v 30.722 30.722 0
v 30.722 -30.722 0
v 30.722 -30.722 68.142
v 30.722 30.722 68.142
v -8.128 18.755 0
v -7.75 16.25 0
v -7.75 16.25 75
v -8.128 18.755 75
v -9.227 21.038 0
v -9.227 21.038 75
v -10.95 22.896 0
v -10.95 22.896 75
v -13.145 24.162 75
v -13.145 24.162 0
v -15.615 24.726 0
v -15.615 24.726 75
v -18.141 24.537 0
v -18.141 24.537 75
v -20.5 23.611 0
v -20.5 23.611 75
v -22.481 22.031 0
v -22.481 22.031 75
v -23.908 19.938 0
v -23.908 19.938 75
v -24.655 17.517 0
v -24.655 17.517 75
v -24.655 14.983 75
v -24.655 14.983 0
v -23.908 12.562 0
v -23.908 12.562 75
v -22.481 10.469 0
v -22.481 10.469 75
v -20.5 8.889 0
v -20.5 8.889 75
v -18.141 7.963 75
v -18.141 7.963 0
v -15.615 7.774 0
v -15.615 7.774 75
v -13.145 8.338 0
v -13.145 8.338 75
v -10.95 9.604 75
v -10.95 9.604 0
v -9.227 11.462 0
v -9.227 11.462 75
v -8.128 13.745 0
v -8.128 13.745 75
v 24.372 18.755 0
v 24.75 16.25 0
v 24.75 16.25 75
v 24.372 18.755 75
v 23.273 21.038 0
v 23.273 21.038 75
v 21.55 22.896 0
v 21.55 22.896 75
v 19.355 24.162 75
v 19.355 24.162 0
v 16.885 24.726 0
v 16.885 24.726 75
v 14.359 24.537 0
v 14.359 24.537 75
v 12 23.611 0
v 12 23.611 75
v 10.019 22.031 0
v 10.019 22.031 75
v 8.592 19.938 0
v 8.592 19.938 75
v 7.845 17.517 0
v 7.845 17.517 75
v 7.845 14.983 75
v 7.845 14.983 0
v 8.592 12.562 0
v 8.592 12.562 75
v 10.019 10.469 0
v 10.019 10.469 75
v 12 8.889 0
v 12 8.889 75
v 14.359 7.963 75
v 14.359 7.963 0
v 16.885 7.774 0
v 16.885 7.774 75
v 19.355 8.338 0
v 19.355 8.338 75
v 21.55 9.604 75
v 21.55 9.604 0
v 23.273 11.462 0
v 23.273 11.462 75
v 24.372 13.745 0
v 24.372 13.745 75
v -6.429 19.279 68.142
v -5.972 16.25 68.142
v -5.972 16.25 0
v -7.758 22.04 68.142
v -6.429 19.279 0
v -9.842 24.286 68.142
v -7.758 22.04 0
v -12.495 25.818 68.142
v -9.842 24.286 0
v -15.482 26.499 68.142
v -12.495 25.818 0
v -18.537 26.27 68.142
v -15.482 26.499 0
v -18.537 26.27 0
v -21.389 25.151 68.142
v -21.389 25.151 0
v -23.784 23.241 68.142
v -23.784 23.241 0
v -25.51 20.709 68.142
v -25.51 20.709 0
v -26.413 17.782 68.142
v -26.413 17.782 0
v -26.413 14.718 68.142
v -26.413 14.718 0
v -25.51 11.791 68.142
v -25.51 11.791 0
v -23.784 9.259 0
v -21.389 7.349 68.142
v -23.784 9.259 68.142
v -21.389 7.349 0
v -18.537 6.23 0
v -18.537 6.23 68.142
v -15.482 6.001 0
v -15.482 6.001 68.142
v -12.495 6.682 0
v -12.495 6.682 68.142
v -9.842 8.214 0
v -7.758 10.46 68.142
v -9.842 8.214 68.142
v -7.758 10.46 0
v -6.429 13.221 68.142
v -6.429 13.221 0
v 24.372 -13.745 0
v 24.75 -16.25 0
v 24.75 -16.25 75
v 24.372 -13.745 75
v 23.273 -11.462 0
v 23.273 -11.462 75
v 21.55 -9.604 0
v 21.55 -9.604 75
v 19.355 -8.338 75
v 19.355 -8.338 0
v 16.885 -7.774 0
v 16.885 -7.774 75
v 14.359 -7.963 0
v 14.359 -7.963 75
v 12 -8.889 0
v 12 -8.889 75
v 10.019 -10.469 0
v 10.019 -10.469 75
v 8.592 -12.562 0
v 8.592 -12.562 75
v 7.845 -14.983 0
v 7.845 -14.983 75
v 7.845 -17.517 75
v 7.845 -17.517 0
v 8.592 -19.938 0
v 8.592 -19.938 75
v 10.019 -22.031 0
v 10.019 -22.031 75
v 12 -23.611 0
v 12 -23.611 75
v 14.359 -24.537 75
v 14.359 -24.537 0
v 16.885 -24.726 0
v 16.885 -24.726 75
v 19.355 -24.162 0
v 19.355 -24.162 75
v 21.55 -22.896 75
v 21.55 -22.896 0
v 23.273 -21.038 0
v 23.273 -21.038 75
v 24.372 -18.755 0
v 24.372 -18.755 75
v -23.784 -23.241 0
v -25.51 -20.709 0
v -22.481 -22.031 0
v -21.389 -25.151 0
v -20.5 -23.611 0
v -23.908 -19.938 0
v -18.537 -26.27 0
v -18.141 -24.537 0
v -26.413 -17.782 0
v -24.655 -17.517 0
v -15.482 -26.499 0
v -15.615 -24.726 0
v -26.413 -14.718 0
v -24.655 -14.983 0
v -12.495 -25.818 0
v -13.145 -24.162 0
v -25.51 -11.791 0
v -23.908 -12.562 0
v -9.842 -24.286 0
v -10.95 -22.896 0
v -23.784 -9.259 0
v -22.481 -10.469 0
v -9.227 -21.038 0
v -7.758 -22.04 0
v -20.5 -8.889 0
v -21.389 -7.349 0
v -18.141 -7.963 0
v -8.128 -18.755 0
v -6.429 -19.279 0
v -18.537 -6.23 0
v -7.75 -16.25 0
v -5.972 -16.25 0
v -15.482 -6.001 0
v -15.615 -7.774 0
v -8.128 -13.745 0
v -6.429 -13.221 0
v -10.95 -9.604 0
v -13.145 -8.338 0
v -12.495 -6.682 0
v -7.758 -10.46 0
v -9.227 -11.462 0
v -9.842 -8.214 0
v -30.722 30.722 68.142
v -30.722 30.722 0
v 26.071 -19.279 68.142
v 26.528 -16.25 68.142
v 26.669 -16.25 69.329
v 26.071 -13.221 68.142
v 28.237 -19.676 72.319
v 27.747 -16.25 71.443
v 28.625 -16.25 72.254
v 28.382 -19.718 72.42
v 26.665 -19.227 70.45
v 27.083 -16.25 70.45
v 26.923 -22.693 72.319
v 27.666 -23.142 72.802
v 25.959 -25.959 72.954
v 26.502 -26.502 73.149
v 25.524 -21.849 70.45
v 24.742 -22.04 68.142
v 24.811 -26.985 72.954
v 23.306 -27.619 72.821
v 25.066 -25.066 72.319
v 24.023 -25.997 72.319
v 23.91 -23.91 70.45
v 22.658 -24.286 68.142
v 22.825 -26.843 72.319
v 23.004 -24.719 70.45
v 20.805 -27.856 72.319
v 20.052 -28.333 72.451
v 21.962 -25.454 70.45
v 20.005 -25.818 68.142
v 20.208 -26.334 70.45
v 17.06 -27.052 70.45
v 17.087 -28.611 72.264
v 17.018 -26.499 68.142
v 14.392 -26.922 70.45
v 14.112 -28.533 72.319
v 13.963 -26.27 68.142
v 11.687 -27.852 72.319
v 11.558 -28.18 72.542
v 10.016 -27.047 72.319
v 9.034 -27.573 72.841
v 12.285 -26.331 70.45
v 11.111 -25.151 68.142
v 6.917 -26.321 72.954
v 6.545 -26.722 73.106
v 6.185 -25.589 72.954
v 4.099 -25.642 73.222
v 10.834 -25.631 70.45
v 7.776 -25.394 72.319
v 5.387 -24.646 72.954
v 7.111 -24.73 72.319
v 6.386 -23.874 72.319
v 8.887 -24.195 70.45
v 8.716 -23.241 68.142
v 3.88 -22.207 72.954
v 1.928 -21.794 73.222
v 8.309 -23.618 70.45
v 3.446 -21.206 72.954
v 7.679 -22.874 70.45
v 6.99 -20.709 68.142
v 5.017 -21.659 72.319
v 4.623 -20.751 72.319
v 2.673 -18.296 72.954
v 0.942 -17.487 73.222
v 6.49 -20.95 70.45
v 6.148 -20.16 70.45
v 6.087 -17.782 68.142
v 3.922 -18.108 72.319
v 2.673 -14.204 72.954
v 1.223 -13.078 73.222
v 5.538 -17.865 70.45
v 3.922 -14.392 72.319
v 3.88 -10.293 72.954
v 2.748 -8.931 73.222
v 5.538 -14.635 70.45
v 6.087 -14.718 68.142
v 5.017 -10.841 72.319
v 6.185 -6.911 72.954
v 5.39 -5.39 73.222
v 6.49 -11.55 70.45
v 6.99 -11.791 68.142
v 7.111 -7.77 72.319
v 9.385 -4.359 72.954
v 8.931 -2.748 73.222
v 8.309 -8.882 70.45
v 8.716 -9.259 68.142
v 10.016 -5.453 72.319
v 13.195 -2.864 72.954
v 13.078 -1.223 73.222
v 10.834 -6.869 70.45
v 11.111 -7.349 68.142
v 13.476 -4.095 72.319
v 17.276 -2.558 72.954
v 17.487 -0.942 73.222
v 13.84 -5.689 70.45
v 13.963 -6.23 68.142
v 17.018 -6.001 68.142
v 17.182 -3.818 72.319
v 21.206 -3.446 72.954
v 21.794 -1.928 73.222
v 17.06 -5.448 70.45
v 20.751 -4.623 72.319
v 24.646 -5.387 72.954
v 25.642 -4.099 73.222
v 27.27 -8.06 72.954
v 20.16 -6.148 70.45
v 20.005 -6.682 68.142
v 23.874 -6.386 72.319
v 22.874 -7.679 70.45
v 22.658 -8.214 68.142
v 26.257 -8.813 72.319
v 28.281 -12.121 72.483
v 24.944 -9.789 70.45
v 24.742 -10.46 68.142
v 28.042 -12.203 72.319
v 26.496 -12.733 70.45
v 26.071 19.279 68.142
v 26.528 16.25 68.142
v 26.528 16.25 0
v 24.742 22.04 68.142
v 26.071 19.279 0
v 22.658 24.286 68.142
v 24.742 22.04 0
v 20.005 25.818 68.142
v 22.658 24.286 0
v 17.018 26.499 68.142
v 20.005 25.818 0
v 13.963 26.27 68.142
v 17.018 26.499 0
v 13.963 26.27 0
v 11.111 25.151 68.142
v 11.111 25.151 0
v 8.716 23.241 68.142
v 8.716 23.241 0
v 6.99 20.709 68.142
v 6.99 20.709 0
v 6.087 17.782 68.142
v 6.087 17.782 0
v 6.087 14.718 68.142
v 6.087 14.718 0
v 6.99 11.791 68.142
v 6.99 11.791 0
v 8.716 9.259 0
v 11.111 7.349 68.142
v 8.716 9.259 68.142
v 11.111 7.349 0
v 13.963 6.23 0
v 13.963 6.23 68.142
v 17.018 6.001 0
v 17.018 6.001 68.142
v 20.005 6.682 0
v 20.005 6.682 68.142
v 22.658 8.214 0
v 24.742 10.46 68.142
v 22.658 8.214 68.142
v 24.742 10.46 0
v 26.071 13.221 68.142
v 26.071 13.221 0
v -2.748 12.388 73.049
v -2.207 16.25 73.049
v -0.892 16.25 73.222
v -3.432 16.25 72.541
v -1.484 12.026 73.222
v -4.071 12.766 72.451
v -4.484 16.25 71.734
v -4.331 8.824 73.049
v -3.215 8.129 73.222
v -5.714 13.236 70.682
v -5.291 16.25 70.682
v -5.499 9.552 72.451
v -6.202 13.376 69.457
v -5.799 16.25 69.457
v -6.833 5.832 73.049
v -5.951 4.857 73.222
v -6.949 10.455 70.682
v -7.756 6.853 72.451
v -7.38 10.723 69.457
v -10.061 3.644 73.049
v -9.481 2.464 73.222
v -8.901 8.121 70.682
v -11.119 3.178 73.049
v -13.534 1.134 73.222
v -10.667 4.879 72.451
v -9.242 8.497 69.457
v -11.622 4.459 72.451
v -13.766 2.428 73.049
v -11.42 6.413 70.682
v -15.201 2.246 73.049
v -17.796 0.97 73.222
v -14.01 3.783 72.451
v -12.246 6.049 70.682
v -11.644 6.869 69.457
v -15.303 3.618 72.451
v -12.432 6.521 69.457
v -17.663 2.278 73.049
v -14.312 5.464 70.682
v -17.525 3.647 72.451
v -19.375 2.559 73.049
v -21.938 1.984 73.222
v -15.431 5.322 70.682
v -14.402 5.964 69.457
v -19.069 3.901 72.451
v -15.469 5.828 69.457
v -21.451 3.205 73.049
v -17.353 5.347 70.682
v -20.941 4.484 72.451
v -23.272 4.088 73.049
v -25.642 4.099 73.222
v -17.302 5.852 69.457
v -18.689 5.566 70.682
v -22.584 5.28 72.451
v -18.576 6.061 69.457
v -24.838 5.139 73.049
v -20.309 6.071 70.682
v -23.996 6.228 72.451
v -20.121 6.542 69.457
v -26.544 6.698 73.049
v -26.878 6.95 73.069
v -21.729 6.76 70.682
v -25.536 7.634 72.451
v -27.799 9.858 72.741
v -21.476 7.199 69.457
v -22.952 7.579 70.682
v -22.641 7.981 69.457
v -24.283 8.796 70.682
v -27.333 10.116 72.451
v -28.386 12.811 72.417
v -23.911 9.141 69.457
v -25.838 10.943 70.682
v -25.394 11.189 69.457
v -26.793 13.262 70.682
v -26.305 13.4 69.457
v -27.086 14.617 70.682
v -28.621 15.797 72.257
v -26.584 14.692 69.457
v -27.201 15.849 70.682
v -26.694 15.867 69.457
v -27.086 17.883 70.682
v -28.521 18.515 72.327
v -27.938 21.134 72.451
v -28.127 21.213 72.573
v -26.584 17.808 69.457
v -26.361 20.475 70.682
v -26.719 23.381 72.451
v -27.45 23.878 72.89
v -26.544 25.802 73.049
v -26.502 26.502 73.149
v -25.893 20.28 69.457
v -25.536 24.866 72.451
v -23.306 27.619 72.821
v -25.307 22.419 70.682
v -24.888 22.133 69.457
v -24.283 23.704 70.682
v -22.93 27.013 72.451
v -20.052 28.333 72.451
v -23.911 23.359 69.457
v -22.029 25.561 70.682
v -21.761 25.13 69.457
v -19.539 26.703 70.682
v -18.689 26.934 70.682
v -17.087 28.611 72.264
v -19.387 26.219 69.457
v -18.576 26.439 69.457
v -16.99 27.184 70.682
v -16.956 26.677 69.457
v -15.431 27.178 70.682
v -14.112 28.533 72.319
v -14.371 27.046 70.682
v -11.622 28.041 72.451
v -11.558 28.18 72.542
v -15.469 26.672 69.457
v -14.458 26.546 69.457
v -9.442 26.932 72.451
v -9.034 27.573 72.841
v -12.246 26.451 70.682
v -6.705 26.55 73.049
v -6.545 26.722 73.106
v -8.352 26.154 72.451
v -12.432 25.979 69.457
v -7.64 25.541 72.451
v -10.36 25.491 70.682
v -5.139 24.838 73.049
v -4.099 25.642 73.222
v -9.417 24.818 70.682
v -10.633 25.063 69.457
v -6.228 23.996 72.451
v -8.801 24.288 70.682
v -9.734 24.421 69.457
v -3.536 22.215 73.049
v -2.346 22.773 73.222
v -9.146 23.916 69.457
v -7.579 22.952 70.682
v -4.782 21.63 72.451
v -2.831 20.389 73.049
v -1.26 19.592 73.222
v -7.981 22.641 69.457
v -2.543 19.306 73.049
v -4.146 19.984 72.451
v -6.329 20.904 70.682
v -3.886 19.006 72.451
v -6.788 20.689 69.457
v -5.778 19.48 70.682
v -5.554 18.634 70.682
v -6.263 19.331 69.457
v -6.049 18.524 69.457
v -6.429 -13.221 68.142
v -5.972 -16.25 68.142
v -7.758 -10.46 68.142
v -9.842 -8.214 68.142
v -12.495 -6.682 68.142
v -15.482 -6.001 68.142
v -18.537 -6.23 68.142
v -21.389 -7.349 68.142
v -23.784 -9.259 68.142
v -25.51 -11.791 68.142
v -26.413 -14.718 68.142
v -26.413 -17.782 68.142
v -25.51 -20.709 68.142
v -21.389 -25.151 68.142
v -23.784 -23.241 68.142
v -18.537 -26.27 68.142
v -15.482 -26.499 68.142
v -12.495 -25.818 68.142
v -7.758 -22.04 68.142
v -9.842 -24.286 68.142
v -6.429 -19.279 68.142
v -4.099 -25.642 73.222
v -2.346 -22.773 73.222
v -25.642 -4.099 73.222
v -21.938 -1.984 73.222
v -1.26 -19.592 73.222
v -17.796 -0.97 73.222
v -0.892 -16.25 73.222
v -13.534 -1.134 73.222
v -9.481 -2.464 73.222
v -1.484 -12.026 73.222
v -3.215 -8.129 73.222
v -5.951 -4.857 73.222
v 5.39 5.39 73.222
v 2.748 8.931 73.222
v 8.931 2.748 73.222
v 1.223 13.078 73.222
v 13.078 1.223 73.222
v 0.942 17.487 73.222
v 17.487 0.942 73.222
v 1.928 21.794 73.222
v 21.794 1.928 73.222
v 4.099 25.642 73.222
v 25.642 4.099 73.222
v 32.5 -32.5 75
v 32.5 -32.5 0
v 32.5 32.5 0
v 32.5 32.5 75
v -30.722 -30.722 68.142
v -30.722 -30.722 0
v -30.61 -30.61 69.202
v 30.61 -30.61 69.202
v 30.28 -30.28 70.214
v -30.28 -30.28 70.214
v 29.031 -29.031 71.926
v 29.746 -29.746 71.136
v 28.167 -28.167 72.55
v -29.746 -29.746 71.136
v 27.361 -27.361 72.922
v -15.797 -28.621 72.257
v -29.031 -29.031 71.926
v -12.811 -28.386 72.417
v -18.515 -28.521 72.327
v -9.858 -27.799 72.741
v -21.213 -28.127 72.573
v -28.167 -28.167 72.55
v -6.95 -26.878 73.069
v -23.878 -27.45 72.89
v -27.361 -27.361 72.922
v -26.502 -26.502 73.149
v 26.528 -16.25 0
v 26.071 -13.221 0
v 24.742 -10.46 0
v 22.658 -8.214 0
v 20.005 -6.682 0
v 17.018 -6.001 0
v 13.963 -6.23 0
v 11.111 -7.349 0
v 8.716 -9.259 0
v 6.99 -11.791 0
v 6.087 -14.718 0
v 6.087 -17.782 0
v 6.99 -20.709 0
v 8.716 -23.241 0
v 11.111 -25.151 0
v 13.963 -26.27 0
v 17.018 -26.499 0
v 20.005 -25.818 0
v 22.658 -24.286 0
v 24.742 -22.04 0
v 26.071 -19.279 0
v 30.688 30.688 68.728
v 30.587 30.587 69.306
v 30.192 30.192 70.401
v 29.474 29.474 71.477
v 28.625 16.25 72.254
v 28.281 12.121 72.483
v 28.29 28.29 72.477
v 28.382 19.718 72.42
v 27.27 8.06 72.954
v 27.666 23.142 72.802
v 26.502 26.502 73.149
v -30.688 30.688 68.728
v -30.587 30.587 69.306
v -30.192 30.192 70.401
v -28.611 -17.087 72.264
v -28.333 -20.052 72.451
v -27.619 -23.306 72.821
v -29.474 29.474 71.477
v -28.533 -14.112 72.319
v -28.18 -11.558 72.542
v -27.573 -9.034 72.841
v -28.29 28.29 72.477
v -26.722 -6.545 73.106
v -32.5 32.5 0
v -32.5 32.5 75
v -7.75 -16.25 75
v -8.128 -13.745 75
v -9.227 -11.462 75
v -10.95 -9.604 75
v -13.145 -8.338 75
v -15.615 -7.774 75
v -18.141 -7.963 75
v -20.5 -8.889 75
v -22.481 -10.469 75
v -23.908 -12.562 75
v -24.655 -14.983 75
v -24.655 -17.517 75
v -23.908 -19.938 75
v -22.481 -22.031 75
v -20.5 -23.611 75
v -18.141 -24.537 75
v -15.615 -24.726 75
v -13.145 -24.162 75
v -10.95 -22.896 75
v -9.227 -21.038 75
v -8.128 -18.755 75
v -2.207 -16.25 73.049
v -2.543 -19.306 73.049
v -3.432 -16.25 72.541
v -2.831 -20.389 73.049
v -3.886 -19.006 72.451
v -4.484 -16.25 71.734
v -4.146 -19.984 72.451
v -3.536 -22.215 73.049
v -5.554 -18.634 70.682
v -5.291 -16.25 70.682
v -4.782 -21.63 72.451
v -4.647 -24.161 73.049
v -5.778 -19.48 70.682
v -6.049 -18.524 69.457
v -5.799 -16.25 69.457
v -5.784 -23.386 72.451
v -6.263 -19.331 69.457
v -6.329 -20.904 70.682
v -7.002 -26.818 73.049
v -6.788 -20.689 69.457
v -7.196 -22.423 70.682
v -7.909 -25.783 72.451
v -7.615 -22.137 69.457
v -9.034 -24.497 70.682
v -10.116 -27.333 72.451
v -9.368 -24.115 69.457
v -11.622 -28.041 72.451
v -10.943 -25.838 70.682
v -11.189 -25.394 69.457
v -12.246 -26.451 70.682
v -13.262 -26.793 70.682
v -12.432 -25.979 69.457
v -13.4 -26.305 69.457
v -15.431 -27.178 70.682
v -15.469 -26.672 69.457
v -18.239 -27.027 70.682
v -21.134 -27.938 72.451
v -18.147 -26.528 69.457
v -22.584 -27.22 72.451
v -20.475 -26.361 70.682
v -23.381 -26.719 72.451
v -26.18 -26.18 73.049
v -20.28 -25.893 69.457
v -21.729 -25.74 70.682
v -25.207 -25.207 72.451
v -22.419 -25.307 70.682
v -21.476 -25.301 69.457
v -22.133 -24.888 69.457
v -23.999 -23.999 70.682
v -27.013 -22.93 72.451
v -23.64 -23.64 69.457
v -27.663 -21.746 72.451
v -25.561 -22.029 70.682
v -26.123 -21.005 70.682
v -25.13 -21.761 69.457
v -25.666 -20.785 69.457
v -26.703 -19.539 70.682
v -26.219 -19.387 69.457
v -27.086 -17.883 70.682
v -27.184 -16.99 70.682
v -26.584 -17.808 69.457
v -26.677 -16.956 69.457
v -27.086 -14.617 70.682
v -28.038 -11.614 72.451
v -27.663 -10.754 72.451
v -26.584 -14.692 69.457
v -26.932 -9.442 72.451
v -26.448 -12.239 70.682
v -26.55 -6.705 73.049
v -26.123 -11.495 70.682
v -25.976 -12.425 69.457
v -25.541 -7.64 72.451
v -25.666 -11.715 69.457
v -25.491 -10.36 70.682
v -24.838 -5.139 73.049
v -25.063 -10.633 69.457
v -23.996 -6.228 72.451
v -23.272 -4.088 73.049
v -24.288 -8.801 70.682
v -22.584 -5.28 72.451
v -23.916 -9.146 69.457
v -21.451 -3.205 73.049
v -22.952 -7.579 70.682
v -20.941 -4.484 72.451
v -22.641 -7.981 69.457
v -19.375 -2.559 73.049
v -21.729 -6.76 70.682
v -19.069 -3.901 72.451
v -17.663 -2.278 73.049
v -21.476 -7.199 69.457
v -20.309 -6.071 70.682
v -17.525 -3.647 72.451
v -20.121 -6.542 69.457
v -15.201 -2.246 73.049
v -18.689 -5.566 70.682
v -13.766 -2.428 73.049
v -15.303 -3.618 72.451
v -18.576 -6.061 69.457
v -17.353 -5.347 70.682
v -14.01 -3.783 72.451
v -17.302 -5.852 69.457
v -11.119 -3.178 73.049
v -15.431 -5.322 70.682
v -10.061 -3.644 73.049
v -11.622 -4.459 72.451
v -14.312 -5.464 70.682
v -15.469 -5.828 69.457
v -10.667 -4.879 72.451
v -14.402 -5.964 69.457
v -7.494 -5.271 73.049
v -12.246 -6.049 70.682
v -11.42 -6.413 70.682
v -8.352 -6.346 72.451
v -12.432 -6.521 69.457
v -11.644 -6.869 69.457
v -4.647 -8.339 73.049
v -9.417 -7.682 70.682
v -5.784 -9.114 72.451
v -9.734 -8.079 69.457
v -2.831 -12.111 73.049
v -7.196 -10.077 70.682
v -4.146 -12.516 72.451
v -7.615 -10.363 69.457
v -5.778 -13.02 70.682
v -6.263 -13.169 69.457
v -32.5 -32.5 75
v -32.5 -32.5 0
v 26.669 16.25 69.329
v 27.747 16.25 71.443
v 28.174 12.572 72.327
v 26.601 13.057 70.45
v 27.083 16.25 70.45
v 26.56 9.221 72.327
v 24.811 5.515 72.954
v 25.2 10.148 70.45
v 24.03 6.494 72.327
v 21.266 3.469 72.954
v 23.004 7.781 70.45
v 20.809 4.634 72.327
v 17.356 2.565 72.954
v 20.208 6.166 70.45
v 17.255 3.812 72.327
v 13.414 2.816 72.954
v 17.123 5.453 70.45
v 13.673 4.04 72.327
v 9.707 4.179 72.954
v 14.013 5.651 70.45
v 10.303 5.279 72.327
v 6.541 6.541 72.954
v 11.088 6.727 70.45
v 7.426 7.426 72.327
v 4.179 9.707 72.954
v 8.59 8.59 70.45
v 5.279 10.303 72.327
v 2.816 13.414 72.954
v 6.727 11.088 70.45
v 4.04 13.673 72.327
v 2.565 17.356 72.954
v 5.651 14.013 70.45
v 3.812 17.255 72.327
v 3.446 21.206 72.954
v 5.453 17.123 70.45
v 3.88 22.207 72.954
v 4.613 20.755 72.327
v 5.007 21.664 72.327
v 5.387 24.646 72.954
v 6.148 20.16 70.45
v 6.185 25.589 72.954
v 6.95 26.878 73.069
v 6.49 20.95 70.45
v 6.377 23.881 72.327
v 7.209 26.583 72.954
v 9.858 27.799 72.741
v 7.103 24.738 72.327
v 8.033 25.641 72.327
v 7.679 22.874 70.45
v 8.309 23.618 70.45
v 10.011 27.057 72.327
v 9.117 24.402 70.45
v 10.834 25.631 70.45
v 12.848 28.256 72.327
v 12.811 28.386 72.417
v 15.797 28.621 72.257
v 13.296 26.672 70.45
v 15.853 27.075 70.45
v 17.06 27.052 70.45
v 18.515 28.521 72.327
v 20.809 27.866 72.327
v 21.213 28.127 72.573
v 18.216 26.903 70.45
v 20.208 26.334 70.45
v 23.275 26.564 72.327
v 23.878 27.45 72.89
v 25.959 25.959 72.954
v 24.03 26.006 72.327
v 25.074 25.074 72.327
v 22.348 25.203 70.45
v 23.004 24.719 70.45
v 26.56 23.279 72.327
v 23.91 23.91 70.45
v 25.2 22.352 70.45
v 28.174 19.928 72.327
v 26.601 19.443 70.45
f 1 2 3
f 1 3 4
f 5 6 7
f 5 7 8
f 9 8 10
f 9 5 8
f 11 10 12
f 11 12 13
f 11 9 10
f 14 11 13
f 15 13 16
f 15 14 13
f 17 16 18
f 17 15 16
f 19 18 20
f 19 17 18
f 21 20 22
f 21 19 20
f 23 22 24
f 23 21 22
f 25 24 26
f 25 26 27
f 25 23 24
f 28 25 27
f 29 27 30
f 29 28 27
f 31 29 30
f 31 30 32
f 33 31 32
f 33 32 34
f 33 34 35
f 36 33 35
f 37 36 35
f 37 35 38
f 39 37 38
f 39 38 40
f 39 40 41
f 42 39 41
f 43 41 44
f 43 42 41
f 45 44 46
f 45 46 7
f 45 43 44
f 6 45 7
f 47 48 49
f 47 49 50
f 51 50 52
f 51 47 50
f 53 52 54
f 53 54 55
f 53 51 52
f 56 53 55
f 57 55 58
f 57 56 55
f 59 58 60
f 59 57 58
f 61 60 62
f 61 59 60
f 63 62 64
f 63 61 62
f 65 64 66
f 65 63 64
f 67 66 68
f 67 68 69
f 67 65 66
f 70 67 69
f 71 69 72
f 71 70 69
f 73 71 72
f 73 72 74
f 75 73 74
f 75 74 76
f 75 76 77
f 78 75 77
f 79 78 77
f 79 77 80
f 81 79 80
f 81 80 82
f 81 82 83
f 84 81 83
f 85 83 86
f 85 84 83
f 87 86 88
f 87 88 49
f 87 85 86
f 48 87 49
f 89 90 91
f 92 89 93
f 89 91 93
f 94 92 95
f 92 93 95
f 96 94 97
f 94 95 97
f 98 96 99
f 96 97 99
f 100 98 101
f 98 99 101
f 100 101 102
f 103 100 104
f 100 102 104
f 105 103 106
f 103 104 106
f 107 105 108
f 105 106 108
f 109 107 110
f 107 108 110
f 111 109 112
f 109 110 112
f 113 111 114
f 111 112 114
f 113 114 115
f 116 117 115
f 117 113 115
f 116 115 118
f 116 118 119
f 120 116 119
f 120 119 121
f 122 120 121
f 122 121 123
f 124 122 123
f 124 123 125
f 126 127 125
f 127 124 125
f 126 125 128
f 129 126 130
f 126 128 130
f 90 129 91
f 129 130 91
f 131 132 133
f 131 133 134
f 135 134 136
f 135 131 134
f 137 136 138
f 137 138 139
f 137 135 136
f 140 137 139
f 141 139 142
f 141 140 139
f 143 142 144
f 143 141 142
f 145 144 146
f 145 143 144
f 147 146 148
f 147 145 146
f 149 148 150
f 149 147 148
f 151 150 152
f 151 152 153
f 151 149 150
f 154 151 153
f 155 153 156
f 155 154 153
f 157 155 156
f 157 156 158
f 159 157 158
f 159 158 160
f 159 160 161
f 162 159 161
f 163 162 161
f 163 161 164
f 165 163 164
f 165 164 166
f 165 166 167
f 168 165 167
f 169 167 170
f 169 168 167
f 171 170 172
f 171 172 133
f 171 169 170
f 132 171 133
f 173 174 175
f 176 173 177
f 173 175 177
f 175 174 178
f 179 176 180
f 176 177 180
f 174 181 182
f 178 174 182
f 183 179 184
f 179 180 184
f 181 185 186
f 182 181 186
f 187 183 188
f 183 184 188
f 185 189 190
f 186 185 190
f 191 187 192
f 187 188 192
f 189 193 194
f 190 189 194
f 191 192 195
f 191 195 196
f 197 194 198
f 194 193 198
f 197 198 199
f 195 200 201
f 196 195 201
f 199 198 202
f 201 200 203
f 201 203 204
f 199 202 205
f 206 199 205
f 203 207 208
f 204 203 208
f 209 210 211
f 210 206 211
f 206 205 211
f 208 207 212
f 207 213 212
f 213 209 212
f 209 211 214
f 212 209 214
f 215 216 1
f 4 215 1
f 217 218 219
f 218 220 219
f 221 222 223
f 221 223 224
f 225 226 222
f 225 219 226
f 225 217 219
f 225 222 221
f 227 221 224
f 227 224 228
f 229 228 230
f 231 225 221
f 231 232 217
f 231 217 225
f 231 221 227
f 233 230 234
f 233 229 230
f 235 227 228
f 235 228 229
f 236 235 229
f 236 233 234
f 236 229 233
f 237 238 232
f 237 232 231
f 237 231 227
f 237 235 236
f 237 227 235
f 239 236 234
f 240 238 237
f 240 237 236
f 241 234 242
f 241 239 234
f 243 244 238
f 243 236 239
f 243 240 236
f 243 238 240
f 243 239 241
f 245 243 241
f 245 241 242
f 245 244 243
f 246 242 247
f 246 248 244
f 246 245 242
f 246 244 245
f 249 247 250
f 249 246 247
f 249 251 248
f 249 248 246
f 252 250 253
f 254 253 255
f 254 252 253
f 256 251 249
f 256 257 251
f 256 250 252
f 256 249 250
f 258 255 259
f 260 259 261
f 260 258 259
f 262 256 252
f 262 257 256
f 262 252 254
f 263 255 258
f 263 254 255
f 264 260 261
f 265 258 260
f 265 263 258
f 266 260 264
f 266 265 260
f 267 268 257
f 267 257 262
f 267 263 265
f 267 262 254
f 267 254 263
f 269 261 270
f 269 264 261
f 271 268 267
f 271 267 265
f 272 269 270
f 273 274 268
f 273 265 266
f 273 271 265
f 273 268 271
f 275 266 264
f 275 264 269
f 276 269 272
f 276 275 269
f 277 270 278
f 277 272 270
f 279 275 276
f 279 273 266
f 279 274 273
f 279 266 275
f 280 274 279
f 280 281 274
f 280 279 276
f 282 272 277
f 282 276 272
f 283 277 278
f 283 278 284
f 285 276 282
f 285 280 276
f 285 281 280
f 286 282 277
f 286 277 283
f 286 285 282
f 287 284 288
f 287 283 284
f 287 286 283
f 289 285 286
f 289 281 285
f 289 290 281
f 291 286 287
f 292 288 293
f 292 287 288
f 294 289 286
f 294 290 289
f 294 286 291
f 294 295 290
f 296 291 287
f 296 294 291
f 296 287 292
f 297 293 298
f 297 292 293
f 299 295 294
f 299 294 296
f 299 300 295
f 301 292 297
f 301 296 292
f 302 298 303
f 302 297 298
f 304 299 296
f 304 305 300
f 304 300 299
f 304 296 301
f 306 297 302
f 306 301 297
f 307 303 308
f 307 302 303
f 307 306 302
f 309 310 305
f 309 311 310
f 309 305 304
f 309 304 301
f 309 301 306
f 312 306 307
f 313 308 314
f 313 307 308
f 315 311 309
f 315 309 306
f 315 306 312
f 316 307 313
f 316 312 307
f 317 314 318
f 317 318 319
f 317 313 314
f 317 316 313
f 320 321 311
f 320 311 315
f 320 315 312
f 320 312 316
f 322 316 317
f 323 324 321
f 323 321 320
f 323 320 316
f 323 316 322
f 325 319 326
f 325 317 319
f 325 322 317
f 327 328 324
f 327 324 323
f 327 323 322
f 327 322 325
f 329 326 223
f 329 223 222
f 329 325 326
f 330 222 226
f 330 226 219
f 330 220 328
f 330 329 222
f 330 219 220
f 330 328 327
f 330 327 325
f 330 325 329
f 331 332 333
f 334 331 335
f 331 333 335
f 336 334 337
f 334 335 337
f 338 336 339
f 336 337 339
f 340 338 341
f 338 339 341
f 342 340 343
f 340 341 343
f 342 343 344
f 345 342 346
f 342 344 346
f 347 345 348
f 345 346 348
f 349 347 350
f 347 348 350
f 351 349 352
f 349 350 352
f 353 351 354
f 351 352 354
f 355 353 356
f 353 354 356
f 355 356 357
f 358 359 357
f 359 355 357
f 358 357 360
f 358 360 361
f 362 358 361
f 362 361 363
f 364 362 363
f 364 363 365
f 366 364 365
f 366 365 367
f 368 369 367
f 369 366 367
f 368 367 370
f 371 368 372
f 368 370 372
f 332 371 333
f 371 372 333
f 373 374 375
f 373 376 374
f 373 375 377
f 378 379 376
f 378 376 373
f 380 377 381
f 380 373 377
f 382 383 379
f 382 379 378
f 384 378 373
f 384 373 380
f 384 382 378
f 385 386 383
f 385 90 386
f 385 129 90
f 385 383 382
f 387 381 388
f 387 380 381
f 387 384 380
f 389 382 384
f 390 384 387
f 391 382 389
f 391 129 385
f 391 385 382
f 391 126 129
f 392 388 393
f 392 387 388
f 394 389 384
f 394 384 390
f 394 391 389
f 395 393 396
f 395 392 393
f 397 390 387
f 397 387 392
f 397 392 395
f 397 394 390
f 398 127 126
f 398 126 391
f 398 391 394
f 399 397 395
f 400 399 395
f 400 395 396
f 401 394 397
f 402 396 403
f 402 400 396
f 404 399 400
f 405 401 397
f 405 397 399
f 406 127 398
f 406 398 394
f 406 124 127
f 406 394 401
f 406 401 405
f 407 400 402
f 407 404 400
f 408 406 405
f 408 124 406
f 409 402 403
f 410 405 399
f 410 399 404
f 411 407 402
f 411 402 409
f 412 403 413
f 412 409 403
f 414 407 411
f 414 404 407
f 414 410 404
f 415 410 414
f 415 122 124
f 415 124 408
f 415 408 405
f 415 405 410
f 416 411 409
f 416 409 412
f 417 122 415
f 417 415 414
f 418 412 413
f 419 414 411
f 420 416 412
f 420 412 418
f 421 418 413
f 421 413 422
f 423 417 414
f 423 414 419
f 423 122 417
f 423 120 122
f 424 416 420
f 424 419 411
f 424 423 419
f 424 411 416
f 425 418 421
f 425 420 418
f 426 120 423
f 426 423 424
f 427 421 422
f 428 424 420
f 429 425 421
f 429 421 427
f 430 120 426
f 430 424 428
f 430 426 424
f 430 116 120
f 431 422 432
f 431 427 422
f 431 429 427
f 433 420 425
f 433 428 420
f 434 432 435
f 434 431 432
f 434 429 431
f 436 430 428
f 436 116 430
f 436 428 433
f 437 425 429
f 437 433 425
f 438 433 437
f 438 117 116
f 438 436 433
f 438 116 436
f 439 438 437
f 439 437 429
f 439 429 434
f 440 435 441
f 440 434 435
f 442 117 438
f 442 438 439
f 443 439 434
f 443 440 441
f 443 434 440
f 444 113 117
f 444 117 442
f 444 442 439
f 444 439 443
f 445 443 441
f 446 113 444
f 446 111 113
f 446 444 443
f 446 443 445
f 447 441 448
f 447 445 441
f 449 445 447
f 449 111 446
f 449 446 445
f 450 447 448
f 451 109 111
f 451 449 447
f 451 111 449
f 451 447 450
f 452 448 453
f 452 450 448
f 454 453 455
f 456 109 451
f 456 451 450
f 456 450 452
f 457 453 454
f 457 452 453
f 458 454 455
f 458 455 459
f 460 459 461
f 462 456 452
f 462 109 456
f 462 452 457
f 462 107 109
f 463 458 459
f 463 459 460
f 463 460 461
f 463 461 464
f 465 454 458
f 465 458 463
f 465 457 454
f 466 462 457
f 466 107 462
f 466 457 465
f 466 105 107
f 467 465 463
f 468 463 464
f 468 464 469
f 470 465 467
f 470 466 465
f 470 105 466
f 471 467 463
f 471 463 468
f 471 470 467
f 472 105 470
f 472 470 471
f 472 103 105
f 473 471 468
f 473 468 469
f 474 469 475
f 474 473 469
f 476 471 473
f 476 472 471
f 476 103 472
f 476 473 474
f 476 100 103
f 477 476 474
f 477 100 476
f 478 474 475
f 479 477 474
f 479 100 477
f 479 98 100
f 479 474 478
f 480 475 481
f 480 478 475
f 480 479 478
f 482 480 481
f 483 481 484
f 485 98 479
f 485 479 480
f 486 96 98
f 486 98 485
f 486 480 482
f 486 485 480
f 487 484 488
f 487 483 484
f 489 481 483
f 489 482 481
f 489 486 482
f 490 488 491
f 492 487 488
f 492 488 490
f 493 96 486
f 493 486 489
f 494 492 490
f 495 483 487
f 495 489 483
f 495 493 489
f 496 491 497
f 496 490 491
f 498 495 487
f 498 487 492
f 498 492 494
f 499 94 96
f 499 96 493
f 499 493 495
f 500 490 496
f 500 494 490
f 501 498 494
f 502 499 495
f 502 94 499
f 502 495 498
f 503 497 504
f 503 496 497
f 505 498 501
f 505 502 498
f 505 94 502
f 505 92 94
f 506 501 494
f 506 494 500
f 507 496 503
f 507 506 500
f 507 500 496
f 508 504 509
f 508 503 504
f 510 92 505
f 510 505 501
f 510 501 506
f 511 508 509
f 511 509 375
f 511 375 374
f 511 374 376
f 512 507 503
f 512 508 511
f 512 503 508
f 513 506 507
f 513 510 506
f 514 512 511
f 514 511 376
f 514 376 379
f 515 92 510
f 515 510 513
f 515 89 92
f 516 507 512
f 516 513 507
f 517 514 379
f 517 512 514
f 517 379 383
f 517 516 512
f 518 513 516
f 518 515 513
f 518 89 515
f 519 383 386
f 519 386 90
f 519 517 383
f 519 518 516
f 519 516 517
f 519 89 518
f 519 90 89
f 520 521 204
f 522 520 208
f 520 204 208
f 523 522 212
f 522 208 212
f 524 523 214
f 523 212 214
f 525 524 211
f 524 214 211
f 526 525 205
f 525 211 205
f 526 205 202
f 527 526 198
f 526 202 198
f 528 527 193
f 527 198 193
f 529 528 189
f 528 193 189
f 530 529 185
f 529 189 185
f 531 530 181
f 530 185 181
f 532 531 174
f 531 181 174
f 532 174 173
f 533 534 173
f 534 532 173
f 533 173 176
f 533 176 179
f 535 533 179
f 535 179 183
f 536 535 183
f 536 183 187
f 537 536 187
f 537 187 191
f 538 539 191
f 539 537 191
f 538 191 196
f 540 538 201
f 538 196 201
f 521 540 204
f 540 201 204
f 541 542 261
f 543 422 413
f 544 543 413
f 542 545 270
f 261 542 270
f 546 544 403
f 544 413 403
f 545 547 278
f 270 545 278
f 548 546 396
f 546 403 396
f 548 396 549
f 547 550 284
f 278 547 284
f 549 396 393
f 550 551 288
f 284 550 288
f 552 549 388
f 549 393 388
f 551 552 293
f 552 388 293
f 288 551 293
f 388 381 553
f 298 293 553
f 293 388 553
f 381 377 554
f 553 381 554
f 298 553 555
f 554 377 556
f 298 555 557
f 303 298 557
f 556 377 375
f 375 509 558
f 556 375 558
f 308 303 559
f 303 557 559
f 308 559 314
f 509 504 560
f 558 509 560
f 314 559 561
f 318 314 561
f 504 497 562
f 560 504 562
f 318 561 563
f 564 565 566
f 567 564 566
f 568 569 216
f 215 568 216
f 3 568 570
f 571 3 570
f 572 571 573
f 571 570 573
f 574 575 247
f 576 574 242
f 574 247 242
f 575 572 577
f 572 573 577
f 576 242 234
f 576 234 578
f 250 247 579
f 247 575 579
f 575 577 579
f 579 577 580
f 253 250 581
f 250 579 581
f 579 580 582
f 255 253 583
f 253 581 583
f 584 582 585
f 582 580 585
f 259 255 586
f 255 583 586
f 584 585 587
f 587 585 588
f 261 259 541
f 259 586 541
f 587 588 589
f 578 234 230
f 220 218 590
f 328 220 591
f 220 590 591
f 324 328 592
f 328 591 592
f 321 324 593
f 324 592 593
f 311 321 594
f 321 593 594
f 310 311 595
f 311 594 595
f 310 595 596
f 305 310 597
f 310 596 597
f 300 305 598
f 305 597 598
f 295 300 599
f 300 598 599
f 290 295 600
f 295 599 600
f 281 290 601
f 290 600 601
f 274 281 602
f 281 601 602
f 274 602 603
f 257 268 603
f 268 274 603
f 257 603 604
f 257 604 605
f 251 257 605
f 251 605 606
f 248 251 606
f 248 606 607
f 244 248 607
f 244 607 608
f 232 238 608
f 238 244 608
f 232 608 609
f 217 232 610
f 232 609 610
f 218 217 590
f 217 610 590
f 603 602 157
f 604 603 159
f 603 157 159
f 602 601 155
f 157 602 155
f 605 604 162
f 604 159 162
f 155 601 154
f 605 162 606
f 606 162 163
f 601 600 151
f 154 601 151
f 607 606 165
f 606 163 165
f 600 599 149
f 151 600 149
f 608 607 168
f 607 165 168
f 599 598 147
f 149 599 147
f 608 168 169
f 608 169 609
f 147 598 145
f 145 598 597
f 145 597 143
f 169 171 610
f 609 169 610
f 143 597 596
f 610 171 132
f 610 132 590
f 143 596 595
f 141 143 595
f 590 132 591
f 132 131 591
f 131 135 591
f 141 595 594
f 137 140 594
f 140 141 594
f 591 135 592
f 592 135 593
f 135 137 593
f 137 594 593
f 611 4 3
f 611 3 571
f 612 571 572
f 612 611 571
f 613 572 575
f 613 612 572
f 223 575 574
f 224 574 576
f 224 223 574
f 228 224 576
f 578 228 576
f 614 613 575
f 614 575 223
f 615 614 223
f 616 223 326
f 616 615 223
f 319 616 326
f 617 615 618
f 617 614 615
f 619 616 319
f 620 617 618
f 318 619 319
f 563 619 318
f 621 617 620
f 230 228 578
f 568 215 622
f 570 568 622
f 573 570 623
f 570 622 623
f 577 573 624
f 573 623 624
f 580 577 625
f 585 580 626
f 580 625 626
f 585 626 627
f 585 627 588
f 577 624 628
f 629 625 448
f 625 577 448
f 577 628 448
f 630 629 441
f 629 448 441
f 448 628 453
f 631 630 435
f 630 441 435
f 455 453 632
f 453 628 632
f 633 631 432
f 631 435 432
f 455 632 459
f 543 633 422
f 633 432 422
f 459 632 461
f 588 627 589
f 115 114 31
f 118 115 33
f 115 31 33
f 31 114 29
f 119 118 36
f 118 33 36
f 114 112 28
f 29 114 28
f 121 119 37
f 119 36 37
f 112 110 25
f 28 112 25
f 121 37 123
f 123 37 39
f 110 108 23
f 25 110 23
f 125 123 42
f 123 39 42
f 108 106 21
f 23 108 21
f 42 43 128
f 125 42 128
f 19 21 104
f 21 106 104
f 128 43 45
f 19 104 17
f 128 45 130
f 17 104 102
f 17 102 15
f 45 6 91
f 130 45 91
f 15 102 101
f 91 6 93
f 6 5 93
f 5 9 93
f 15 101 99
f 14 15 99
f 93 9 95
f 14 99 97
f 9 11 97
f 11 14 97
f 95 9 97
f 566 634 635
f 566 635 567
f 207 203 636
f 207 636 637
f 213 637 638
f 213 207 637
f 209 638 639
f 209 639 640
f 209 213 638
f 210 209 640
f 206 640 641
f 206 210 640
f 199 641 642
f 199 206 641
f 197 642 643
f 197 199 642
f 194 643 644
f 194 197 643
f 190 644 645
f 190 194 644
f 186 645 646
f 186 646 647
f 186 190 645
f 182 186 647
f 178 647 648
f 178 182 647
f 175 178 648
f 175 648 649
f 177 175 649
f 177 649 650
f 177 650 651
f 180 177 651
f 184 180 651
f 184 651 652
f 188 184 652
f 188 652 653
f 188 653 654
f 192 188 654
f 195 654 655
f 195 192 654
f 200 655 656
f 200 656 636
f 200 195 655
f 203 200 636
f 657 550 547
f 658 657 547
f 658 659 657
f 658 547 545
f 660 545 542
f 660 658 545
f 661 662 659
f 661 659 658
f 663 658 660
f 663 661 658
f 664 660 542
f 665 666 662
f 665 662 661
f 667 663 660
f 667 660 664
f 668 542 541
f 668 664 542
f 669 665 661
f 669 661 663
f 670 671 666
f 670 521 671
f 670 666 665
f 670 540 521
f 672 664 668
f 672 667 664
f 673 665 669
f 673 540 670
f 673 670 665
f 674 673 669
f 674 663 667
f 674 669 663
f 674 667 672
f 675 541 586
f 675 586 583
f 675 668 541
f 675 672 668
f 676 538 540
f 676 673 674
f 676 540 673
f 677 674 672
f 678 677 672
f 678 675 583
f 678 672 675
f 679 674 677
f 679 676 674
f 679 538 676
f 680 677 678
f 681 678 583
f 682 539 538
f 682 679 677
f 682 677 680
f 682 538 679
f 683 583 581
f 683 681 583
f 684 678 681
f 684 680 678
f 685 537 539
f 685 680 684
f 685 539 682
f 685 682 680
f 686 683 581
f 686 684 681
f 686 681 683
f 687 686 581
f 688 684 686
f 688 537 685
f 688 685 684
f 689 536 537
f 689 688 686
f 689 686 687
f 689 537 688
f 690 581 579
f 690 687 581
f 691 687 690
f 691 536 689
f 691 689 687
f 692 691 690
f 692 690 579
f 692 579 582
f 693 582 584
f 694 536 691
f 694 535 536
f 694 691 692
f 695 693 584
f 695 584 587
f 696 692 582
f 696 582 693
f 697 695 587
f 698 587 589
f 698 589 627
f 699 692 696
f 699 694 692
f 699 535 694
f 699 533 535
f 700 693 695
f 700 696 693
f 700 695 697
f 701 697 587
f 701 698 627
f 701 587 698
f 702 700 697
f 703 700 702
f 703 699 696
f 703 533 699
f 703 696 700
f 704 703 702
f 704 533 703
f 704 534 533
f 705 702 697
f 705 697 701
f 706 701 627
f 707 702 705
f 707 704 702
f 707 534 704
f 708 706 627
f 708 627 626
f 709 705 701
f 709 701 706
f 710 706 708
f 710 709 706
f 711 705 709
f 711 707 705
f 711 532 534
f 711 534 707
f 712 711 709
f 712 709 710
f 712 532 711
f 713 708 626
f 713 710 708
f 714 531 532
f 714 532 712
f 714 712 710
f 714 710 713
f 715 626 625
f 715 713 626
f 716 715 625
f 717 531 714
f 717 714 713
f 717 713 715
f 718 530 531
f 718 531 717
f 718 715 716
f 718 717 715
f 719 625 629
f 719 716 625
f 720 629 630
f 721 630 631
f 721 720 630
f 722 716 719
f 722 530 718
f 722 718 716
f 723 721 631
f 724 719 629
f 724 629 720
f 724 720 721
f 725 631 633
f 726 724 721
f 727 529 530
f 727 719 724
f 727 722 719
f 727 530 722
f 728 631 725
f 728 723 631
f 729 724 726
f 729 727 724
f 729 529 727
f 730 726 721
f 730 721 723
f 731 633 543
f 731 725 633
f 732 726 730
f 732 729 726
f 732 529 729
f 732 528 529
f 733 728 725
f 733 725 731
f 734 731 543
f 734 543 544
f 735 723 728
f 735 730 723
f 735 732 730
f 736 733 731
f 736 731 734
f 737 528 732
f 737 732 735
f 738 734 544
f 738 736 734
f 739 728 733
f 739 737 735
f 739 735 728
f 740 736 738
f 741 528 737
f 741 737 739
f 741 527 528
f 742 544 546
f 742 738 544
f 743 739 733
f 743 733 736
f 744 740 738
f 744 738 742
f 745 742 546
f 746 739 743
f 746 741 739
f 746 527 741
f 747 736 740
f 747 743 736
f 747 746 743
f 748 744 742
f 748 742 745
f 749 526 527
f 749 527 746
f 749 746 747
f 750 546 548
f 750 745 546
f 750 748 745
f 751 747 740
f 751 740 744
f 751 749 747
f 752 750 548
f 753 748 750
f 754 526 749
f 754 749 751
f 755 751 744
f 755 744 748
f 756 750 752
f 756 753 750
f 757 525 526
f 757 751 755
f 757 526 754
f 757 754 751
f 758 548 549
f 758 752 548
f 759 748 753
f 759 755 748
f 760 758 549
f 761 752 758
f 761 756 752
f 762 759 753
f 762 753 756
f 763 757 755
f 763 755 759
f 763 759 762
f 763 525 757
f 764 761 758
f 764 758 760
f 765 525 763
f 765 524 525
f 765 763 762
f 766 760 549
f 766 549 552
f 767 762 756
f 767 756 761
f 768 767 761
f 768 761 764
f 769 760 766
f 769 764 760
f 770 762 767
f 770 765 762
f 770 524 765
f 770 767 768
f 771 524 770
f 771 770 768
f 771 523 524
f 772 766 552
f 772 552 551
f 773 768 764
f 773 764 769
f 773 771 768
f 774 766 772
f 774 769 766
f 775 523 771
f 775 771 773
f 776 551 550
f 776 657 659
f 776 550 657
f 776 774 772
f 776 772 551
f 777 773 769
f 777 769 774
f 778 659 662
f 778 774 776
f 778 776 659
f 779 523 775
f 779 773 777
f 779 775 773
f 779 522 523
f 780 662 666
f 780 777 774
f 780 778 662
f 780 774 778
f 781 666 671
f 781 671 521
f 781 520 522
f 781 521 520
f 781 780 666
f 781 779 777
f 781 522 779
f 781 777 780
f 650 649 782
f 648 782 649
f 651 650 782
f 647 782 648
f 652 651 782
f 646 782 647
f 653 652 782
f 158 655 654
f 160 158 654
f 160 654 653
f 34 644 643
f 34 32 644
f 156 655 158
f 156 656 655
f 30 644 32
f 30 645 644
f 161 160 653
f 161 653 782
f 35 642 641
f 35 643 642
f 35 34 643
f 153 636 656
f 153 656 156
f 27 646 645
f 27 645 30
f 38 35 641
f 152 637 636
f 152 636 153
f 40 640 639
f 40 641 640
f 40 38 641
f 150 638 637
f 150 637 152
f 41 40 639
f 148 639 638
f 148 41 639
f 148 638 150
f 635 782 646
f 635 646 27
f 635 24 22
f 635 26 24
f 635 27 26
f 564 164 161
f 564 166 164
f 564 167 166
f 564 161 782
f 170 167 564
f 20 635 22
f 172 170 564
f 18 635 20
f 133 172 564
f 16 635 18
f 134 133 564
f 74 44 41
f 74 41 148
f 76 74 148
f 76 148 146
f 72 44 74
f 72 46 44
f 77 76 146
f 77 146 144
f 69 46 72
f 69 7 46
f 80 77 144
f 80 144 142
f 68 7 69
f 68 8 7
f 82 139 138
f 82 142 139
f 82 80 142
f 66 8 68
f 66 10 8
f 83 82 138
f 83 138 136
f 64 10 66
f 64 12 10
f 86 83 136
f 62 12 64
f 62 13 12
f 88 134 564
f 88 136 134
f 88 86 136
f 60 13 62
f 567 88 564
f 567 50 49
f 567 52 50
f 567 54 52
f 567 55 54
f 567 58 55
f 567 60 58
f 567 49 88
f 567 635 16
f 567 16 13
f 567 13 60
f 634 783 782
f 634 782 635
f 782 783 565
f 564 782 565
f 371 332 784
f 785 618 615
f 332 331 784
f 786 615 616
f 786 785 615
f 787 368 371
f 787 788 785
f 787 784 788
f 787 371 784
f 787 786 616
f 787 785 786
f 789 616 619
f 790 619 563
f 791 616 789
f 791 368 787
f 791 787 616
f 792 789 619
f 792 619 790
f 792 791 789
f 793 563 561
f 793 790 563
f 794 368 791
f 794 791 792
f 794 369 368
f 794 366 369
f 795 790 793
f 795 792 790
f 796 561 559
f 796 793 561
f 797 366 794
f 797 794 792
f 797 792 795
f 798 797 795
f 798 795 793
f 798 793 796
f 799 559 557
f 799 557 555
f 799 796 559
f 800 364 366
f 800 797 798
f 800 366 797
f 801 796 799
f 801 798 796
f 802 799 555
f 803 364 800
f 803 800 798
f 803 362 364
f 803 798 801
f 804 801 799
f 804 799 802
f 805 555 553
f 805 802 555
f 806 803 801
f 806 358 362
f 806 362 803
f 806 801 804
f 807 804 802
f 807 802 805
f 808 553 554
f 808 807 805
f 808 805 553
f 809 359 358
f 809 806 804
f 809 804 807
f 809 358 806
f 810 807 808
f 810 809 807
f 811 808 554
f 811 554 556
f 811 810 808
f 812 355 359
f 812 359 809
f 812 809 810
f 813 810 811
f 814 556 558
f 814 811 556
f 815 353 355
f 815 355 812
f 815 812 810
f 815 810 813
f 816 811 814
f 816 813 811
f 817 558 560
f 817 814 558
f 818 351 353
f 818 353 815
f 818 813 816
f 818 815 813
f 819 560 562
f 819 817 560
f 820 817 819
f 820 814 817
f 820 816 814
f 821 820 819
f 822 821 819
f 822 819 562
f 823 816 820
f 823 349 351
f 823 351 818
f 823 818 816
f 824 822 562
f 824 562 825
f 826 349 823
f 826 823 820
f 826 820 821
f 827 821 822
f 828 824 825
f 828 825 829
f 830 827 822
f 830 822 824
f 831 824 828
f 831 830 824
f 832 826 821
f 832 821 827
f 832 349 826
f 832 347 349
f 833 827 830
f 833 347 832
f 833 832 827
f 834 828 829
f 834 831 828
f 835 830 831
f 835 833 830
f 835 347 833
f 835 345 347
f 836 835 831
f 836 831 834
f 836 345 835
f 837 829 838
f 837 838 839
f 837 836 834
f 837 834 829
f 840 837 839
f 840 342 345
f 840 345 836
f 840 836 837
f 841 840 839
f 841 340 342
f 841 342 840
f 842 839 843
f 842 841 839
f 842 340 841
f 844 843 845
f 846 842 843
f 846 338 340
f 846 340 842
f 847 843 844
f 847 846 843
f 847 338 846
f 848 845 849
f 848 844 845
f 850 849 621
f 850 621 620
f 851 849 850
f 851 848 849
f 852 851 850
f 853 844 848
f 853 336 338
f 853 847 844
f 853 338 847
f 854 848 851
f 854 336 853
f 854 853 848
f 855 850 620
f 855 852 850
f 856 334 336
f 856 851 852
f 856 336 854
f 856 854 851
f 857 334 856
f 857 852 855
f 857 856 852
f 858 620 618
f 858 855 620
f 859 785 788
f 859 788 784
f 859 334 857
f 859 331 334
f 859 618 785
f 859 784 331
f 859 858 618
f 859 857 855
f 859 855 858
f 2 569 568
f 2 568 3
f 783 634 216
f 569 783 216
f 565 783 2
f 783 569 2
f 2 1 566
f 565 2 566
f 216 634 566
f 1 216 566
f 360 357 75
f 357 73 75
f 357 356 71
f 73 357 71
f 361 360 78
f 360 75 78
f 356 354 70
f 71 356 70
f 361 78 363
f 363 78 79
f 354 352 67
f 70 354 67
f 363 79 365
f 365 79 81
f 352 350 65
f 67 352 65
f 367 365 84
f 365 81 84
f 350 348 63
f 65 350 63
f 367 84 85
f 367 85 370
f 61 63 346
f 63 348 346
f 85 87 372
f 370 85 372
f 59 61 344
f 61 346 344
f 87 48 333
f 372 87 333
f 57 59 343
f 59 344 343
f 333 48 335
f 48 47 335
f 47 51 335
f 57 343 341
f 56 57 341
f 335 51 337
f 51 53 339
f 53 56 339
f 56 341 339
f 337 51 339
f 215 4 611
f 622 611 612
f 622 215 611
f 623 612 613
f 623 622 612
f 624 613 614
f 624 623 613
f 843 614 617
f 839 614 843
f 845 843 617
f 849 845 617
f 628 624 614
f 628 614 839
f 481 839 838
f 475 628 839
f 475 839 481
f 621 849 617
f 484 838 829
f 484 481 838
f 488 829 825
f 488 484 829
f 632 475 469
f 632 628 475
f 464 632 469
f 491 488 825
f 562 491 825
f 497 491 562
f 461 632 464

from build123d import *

# Parameters (mm, degrees)
F0_W        = 65
F0_H        = 65
F0_R        = 8.5
F1_DEPTH    = 75
F2_T        = -1.778
F3_T1_DEPTH = 61.444
F3_T3_DEPTH = 61.444


# Not quite as in the source:
# - a fillet or chamfer that OpenCascade refuses, or shapes differently, is made with other operations: its cross-section is extruded or revolved along the edge and cut away or added


with BuildPart() as f1:
    # F0 (on Top) → F1 (new body)
    with BuildSketch(Plane.XY):
        Rectangle(F0_W, F0_H)
        with Locations((-16.25, -16.25)):
            Circle(F0_R, mode=Mode.SUBTRACT)
        with Locations((16.25, -16.25)):
            Circle(F0_R, mode=Mode.SUBTRACT)
        with Locations((-16.25, 16.25)):
            Circle(F0_R, mode=Mode.SUBTRACT)
        with Locations((16.25, 16.25)):
            Circle(F0_R, mode=Mode.SUBTRACT)
    extrude(amount=F1_DEPTH)

    # F2
    f2_openings = [f1.faces().sort_by_distance(p)[0] for p in [
        (0, 0, 0),
    ]]
    offset(amount=F2_T, openings=f2_openings)

    # F3: fillet of radius 5.08 on 8 edges, made by hand

    # F3_s2 → F3_t1 (join)
    with BuildSketch(Plane.YZ.offset(-30.722)):
        with BuildLine():
            ThreePointArc((30.722, 68.142), (29.2341024484, 71.7341024484), (25.642, 73.222))
            Line((25.642, 73.222), (30.722, 73.222))
            Line((30.722, 73.222), (30.722, 68.142))
        make_face()
        with BuildLine():
            ThreePointArc((-30.722, 68.142), (-29.2341024484, 71.7341024484), (-25.642, 73.222))
            Line((-25.642, 73.222), (-30.722, 73.222))
            Line((-30.722, 73.222), (-30.722, 68.142))
        make_face()
    extrude(amount=F3_T1_DEPTH)

    # F3_s4 → F3_t3 (join)
    with BuildSketch(Plane.XZ.offset(-30.722)):
        with BuildLine():
            ThreePointArc((-30.722, 68.142), (-29.2341024484, 71.7341024484), (-25.642, 73.222))
            Line((-25.642, 73.222), (-30.722, 73.222))
            Line((-30.722, 73.222), (-30.722, 68.142))
        make_face()
        with BuildLine():
            ThreePointArc((30.722, 68.142), (29.2341024484, 71.7341024484), (25.642, 73.222))
            Line((25.642, 73.222), (30.722, 73.222))
            Line((30.722, 73.222), (30.722, 68.142))
        make_face()
    extrude(amount=F3_T3_DEPTH)

    # F3_s5 → F3_t6 (revolve)
    with BuildSketch(Plane.XZ.offset(16.25)):
        with BuildLine():
            ThreePointArc((-0.892, 73.222), (-4.4841024484, 71.7341024484), (-5.972, 68.142))
            Line((-5.972, 68.142), (-5.972, 73.222))
            Line((-5.972, 73.222), (-0.892, 73.222))
        make_face()
    revolve(axis=Axis((-16.25, -16.25, 73.222), (0, 0, -1)))

    # F3_s7 → F3_t8 (revolve)
    with BuildSketch(Plane.XZ.offset(16.25)):
        with BuildLine():
            ThreePointArc((31.608, 73.222), (28.0158975516, 71.7341024484), (26.528, 68.142))
            Line((26.528, 68.142), (26.528, 73.222))
            Line((26.528, 73.222), (31.608, 73.222))
        make_face()
    revolve(axis=Axis((16.25, -16.25, 73.222), (0, 0, -1)))

    # F3_s9 → F3_t10 (revolve)
    with BuildSketch(Plane.XZ.offset(-16.25)):
        with BuildLine():
            ThreePointArc((-0.892, 73.222), (-4.4841024484, 71.7341024484), (-5.972, 68.142))
            Line((-5.972, 68.142), (-5.972, 73.222))
            Line((-5.972, 73.222), (-0.892, 73.222))
        make_face()
    revolve(axis=Axis((-16.25, 16.25, 73.222), (0, 0, -1)))

    # F3_s11 → F3_t12 (revolve)
    with BuildSketch(Plane.XZ.offset(-16.25)):
        with BuildLine():
            ThreePointArc((31.608, 73.222), (28.0158975516, 71.7341024484), (26.528, 68.142))
            Line((26.528, 68.142), (26.528, 73.222))
            Line((26.528, 73.222), (31.608, 73.222))
        make_face()
    revolve(axis=Axis((16.25, 16.25, 73.222), (0, 0, -1)))


solid = f1.part
